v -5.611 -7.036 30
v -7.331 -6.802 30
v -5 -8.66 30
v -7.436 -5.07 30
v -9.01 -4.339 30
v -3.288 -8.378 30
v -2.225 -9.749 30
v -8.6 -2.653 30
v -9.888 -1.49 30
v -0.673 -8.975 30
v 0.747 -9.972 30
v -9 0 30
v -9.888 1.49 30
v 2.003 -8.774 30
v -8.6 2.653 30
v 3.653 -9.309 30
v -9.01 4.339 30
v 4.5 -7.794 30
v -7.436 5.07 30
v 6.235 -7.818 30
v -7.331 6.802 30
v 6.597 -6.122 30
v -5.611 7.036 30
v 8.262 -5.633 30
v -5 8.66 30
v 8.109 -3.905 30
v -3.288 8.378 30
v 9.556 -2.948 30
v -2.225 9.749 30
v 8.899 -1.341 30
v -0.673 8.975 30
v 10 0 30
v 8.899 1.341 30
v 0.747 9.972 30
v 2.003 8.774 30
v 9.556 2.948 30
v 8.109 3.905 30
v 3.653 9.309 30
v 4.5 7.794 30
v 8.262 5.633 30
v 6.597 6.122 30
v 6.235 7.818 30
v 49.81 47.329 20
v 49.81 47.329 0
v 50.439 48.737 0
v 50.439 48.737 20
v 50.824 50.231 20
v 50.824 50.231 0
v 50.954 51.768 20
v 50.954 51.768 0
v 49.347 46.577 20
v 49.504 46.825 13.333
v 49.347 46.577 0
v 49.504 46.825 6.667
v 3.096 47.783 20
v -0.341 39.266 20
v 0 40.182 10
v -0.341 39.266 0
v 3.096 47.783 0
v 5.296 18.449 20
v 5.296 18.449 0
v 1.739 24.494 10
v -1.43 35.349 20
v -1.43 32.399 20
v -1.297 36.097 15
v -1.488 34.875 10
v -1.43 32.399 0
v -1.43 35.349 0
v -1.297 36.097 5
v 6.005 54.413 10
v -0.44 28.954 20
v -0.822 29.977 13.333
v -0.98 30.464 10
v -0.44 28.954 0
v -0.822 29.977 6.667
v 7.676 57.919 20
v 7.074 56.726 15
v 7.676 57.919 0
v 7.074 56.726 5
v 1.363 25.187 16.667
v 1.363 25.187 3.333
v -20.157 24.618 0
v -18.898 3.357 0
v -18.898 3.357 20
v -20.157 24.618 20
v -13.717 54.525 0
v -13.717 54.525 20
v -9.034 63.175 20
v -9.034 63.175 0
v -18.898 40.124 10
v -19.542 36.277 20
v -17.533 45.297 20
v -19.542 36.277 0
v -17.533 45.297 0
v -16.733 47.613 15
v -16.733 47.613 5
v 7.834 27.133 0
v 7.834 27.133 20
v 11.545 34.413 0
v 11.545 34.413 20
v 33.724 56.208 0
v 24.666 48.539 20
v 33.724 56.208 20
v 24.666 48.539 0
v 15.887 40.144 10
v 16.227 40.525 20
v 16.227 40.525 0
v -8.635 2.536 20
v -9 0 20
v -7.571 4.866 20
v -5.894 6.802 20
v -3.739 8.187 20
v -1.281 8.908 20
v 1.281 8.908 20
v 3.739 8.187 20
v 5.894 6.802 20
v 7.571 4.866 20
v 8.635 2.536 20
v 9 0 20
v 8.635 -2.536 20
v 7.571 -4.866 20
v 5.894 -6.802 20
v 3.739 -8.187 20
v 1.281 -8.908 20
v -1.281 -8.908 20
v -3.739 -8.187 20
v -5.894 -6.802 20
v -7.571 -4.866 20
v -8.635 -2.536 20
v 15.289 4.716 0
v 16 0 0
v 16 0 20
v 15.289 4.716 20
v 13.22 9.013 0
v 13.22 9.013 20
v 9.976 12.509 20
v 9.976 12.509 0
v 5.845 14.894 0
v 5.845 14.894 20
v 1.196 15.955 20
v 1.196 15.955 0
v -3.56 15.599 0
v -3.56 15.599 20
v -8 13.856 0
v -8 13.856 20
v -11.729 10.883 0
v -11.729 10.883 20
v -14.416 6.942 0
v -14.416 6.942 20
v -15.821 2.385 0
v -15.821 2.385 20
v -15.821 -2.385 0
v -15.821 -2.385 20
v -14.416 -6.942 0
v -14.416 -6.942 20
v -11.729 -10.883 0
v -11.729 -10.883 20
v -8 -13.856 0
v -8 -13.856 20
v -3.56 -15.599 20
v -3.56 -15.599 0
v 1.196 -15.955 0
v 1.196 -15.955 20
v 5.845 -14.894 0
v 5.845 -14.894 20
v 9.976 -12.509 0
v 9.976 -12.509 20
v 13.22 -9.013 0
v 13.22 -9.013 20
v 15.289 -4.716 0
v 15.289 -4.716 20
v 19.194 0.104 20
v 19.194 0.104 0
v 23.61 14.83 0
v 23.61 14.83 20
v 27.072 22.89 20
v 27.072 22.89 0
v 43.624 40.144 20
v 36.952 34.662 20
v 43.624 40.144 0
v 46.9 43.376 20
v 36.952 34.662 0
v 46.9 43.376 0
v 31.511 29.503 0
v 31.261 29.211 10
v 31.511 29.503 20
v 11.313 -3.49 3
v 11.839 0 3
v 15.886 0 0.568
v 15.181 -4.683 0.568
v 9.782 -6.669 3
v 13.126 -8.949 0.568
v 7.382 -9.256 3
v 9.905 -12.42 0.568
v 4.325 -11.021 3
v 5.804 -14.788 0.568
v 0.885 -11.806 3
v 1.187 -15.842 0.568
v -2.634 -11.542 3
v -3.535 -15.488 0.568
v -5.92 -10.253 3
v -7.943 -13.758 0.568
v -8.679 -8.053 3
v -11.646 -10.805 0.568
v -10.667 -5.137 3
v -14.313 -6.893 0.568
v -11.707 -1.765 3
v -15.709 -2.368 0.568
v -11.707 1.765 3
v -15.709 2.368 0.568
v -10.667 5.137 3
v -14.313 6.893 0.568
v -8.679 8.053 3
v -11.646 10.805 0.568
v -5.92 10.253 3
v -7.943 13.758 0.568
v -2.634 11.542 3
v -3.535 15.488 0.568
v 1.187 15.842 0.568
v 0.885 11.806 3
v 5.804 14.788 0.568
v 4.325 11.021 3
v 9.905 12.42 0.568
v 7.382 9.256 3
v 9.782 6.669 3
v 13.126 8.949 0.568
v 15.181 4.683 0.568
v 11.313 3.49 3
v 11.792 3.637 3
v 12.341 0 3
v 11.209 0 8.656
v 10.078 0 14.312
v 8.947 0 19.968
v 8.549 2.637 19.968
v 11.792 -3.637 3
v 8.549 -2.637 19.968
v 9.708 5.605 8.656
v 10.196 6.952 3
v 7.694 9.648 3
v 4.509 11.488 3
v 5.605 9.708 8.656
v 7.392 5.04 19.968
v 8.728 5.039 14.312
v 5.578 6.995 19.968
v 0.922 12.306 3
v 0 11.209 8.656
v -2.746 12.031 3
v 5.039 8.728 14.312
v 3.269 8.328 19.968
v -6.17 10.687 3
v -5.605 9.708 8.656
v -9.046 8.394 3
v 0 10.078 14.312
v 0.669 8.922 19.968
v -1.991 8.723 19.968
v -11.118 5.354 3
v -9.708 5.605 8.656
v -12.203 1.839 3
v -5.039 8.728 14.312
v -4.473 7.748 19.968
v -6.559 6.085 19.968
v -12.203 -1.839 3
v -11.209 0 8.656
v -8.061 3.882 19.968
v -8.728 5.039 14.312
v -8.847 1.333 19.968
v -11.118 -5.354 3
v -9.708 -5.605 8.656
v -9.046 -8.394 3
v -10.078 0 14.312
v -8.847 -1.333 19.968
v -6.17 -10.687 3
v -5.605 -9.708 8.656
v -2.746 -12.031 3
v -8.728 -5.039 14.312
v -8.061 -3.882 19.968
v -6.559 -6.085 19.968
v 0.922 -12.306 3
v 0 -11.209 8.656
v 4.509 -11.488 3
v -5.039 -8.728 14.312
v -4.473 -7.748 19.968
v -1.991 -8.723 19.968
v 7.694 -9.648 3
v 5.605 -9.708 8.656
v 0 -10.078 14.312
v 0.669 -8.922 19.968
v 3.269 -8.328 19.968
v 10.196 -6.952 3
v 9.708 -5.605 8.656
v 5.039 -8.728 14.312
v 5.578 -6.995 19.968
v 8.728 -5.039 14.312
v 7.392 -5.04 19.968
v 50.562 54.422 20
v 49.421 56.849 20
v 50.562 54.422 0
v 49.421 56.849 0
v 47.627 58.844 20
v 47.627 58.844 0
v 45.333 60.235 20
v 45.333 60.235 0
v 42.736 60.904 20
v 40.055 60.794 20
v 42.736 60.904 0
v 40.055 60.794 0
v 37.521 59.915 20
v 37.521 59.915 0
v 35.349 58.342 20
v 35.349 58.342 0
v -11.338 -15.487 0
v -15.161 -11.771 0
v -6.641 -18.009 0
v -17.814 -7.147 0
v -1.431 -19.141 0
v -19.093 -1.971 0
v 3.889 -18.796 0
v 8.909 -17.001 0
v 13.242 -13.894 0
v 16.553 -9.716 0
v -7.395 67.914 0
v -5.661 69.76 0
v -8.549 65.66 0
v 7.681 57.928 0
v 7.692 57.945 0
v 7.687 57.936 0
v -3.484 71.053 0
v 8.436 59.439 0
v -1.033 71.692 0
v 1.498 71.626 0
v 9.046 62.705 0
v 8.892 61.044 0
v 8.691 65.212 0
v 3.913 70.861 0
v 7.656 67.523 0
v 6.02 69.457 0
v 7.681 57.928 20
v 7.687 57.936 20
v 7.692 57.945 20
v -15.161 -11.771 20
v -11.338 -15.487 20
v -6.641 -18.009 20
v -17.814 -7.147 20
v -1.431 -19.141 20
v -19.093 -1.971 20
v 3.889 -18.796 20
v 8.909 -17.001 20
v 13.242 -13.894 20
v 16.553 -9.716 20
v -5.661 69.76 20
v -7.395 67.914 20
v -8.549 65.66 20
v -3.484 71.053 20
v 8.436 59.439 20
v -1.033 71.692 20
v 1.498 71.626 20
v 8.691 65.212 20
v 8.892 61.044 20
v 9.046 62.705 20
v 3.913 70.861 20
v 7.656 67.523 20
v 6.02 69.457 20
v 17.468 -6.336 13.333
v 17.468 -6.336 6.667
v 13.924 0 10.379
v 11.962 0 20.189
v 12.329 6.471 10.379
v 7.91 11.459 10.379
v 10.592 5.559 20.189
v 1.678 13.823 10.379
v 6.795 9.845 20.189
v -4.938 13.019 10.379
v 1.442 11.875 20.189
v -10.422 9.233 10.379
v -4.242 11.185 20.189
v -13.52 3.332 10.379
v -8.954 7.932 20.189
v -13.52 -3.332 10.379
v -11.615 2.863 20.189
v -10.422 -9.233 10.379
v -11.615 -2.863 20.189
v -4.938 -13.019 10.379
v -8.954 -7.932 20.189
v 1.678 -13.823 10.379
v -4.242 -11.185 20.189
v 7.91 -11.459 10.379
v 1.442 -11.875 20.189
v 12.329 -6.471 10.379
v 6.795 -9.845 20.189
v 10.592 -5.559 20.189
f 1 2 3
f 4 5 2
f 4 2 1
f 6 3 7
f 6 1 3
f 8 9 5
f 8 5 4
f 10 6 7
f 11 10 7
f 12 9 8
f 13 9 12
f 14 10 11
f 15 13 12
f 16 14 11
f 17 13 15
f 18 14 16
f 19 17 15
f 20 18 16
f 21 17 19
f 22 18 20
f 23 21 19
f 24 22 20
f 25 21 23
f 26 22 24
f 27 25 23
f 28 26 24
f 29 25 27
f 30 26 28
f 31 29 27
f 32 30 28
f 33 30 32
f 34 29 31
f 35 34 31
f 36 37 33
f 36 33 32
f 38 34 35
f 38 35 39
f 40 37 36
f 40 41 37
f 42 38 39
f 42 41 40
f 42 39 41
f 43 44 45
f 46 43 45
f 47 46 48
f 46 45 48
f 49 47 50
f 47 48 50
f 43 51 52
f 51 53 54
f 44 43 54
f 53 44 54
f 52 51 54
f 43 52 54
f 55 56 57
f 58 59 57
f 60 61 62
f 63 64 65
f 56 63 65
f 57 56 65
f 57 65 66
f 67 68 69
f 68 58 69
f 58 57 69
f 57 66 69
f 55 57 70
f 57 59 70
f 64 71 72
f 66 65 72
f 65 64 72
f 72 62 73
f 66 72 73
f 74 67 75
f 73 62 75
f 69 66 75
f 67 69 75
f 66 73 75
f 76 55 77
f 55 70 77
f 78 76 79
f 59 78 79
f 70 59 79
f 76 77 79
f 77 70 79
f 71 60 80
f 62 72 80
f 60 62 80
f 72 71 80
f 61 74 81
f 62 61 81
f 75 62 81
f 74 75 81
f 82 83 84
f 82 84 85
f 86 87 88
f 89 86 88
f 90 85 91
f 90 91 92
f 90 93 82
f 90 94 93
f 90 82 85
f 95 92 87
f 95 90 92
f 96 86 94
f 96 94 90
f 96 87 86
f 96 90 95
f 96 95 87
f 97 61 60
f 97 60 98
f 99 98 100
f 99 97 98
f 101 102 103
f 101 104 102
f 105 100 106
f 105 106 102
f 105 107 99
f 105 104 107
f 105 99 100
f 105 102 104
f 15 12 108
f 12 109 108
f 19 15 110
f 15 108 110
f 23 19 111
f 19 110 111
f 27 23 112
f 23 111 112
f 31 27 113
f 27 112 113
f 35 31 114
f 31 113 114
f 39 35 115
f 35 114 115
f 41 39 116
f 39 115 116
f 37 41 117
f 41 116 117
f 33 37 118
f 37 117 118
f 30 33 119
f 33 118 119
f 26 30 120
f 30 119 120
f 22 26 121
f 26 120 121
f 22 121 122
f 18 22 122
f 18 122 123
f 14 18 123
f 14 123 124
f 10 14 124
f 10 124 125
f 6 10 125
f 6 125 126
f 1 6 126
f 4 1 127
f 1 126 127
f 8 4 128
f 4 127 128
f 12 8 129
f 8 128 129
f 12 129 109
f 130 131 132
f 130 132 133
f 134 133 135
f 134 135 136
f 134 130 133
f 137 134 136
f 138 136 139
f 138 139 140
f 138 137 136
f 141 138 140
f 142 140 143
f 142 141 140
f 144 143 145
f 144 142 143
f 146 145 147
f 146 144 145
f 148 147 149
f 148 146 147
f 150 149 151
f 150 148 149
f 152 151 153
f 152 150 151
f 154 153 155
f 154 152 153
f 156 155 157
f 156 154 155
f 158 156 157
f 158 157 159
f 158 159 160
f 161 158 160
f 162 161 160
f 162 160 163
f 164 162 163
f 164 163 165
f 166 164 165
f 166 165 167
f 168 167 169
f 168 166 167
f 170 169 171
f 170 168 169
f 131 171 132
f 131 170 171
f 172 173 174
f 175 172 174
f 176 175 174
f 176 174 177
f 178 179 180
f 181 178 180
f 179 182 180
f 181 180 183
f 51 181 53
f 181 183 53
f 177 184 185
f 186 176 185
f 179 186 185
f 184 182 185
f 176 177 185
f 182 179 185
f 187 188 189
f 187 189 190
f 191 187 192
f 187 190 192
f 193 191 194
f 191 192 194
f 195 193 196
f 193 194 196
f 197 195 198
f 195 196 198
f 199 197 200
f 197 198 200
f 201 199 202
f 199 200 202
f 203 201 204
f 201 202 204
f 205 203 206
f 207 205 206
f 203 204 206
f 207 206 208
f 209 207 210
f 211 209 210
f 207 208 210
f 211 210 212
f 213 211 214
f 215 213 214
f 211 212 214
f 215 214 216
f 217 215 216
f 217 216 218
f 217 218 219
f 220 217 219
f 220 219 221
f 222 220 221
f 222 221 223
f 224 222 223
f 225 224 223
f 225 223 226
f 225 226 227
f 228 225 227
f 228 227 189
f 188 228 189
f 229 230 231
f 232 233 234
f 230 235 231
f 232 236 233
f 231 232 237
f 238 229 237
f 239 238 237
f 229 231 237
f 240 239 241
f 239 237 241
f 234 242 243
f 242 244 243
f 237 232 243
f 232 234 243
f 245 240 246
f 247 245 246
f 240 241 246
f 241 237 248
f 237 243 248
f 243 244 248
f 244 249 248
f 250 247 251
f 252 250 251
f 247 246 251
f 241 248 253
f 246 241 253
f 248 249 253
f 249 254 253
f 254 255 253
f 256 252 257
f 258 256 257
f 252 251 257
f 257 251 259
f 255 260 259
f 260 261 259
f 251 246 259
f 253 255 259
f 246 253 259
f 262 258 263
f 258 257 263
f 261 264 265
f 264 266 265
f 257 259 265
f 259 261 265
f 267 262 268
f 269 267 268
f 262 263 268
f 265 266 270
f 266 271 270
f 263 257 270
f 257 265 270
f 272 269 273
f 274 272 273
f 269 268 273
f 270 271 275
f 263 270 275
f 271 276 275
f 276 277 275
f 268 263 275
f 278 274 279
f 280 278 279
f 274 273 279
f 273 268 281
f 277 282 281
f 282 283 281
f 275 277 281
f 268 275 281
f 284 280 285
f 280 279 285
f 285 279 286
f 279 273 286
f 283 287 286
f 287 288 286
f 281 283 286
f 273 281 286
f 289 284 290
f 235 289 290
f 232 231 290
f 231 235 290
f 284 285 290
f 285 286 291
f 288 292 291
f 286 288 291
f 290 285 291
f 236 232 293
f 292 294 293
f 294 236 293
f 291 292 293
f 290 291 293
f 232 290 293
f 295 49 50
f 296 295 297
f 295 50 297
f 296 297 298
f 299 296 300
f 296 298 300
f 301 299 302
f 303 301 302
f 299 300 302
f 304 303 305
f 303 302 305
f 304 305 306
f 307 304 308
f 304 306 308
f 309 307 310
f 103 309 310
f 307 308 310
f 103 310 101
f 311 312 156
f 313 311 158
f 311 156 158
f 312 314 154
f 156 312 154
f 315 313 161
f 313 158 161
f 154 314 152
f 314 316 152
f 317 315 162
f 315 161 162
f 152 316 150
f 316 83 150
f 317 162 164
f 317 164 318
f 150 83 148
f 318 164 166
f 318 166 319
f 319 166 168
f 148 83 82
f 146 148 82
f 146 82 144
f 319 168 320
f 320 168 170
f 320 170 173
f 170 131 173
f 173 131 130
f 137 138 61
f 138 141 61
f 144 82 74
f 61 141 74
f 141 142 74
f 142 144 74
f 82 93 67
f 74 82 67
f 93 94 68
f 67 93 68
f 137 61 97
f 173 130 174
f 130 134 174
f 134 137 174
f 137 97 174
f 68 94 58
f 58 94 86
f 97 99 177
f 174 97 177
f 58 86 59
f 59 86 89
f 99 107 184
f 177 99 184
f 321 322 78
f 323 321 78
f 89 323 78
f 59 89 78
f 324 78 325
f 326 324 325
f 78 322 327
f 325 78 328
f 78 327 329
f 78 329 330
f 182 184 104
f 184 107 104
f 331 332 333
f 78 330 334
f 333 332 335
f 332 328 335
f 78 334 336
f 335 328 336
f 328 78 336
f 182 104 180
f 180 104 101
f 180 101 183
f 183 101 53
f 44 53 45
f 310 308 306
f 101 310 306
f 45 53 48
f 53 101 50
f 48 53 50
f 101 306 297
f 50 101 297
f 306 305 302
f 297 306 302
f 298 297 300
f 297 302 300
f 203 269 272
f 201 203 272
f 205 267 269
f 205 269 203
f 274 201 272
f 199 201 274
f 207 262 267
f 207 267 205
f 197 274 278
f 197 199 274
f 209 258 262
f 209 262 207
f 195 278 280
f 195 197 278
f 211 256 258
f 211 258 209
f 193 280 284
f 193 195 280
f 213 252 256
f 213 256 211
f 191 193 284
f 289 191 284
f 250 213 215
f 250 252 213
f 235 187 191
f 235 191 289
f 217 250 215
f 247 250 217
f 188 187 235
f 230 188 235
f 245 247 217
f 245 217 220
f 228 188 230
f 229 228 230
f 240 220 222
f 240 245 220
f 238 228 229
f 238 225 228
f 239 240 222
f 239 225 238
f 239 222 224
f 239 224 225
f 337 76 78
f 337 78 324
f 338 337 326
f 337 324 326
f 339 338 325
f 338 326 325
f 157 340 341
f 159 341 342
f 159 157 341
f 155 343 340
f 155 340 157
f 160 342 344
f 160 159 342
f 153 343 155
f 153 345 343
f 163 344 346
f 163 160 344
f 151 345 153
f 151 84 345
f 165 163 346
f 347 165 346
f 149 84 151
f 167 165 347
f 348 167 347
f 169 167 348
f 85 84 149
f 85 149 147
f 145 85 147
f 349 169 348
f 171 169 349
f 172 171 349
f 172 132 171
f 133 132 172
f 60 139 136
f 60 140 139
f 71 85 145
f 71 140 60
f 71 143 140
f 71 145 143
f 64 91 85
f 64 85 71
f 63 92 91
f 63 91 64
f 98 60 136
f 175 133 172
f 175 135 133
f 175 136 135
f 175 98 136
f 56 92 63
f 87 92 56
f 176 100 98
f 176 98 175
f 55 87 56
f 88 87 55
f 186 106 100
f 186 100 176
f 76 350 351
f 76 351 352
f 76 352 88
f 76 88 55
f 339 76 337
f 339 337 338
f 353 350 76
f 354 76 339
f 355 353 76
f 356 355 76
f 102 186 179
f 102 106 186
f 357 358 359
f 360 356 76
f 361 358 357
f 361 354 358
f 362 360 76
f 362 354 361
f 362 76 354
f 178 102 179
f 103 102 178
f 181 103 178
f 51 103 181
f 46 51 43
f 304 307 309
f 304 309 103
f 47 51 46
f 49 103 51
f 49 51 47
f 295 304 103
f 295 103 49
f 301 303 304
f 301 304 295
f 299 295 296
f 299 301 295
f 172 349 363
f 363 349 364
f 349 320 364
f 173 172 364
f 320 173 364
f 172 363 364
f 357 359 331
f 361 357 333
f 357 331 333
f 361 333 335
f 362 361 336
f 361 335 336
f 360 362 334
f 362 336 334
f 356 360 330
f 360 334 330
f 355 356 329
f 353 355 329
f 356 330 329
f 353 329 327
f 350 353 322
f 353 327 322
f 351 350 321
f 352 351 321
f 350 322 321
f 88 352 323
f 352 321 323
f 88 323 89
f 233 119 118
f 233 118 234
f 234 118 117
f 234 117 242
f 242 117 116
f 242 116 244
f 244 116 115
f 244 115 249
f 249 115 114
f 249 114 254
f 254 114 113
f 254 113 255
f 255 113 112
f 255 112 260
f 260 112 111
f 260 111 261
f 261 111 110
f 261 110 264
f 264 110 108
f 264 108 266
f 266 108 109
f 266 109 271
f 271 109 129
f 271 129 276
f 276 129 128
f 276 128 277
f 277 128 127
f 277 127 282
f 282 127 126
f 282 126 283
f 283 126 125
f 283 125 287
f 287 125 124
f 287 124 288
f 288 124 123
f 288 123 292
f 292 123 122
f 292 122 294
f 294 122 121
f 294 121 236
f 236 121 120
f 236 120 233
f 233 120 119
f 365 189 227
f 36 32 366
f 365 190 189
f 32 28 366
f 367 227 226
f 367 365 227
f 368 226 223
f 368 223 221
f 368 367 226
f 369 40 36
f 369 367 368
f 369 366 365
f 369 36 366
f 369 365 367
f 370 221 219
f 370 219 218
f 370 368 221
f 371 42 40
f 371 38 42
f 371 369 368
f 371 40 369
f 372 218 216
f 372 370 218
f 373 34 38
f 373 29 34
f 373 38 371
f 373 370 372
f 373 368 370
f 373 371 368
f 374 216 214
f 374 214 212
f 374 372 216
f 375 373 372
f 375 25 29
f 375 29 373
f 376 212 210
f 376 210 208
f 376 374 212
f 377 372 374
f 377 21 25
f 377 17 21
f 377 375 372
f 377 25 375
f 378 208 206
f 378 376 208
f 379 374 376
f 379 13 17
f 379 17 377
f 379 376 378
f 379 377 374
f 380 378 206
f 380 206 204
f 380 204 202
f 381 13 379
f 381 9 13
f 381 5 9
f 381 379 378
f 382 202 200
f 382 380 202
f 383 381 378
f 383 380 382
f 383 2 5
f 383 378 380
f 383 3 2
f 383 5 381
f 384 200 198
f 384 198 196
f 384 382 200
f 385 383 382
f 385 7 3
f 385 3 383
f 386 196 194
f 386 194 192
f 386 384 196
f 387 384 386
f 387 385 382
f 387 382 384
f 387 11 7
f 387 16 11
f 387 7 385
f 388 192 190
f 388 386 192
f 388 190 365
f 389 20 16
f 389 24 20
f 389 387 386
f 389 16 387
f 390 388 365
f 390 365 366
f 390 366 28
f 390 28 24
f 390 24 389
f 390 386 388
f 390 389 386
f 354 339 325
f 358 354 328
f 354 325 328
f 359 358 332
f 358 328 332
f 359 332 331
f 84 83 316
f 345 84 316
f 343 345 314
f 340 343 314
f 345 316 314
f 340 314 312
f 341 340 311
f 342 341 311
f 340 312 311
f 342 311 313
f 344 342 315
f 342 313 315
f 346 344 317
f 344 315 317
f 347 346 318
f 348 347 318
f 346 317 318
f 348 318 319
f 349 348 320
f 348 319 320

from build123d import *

# Parameters (mm, degrees)
F0_R     = 16
F2_R     = 10
F4_T     = -3
F5_DEPTH = 20
F6_D     = 18
F6_DEPTH = 10
F6_TIP   = 5.4077455712
F7_D     = 32
F7_DEPTH = 0.5
F7_TIP   = 9.6137699044


# Not quite as in the source:
# - a feature names something its author has since deleted; it is built from what else it names


with BuildPart() as f3:
    # F0 (on Top) → F3 section 0
    with BuildSketch(Plane.XY):
        Circle(F0_R)
    # F2 (on offset) → F3 section 1
    with BuildSketch(Plane.XY.offset(30)):
        Circle(F2_R)
    loft()

    # F4 (hollow: no face is removed)
    offset(amount=F4_T, mode=Mode.SUBTRACT)

    # F6
    with Locations(Plane.XY.offset(30)):
        with Locations((0, 0)):
            Hole(F6_D / 2, depth=F6_DEPTH)
            with Locations((0, 0, -(F6_DEPTH + F6_TIP / 2))):  # 118° drill point
                Cone(0, F6_D / 2, F6_TIP, mode=Mode.SUBTRACT)

    # F7
    with Locations(Plane(origin=(0, 0, 0), x_dir=(1, 0, 0), z_dir=(0, 0, -1))):
        with Locations((0, 0)):
            Hole(F7_D / 2, depth=F7_DEPTH)
            with Locations((0, 0, -(F7_DEPTH + F7_TIP / 2))):  # 118° drill point
                Cone(0, F7_D / 2, F7_TIP, mode=Mode.SUBTRACT)


with BuildPart() as f5:
    # F0 (on Top) → F5 (new body)
    with BuildSketch(Plane.XY):
        with BuildLine():
            ThreePointArc((19.1937116741, 0.1042258071), (15.2991489183, 11.5907494677), (5.2955546416, 18.4490252286))
            ThreePointArc((5.2955546416, 18.4490252286), (-10.1587733981, 16.2852311588), (-18.8981625306, 3.3569158189))
            ThreePointArc((-18.8981625306, 3.3569158189), (-6.6406726309, -18.0086339809), (16.5533281406, -9.7157994173))
            add(Edge.make_bspline(
                [(16.5533281406, -9.7157994173), (17.4909471556, -6.282790694), (18.3547028822, -3.0072993549), (19.1937116741, 0.1042258071)],
                knots=[0, 0, 0, 0, 0.1115447748, 0.1115447748, 0.1115447748, 0.1115447748], degree=3))
        make_face()
        Circle(F0_R, mode=Mode.SUBTRACT)
        with BuildLine():
            add(Edge.make_bspline(
                [(5.2955546416, 18.4490252286), (7.1746227331, 27.6735369116), (14.3114232279, 40.9606919462), (27.690502152, 50.9134689797), (33.7236113846, 56.2075078487)],
                knots=[0, 0, 0, 0, 0.5007148854, 1, 1, 1, 1], degree=3))
            ThreePointArc((5.2955546416, 18.4490252286), (15.2991489183, 11.5907494677), (19.1937116741, 0.1042258071))
            add(Edge.make_bspline(
                [(19.1937116741, 0.1042258071), (22.5582500765, 12.5818613195), (28.3536912987, 31.8067560439), (44.7186086588, 39.3813644075), (49.3468357907, 46.577233643)],
                knots=[0.1115447748, 0.1115447748, 0.1115447748, 0.1115447748, 0.5588543644, 0.9853987705, 0.9853987705, 0.9853987705, 0.9853987705], degree=3))
            ThreePointArc((49.3468357907, 46.577233643), (36.9461417786, 43.9474887633), (33.7236113846, 56.2075078487))
        make_face()
        with BuildLine():
            ThreePointArc((-18.8981625306, 3.3569158189), (-10.1587733981, 16.2852311588), (5.2955546416, 18.4490252286))
            add(Edge.make_bspline(
                [(5.2955546416, 18.4490252286), (-2.5623629335, 31.2608480453), (-2.628851385, 35.2579723672), (7.0271153581, 56.848888653), (7.6760536531, 57.9190816164)],
                knots=[0, 0, 0, 0, 0.5180671246, 0.9957919408, 0.9957919408, 0.9957919408, 0.9957919408], degree=3))
            ThreePointArc((7.6760536531, 57.9190816164), (-2.7140834876, 54.0759145506), (-9.0335700658, 63.1747591085))
            add(Edge.make_bspline(
                [(-18.8981625306, 3.3569158189), (-20.0090761688, 16.85842438), (-21.9506635835, 40.1142274591), (-13.0991634095, 56.0064077769), (-9.0335700658, 63.1747591085)],
                knots=[0, 0, 0, 0, 0.5477086796, 1, 1, 1, 1], degree=3))
        make_face()
        with BuildLine():
            ThreePointArc((-9.0335700658, 63.1747591085), (-2.7140834876, 54.0759145506), (7.6760536531, 57.9190816164))
            ThreePointArc((7.6760536531, 57.9190816164), (7.6841733008, 57.9321294513), (7.6922707696, 57.9451910618))
            ThreePointArc((7.6922707696, 57.9451910618), (8.7008251114, 60.2307070152), (9.0457796257, 62.704928391))
            ThreePointArc((9.0457796257, 62.704928391), (0.2349946683, 71.7476551115), (-9.0335700658, 63.1747591085))
        make_face()
        with BuildLine():
            ThreePointArc((50.9538851021, 51.7681334168), (44.0590251845, 60.6646267952), (33.7236113846, 56.2075078487))
            ThreePointArc((33.7236113846, 56.2075078487), (36.9461417786, 43.9474887633), (49.3468357907, 46.577233643))
            add(Edge.make_bspline(
                [(49.3468357907, 46.577233643), (49.5052666724, 46.8235586126), (49.6597605763, 47.0739831673), (49.8100817204, 47.3287589848)],
                knots=[0.9853987705, 0.9853987705, 0.9853987705, 0.9853987705, 1, 1, 1, 1], degree=3))
            ThreePointArc((49.8100817204, 47.3287589848), (50.6633399309, 49.4759547848), (50.9538851021, 51.7681334168))
        make_face()
    extrude(amount=F5_DEPTH)


solid = Compound([f3.part, f5.part])
